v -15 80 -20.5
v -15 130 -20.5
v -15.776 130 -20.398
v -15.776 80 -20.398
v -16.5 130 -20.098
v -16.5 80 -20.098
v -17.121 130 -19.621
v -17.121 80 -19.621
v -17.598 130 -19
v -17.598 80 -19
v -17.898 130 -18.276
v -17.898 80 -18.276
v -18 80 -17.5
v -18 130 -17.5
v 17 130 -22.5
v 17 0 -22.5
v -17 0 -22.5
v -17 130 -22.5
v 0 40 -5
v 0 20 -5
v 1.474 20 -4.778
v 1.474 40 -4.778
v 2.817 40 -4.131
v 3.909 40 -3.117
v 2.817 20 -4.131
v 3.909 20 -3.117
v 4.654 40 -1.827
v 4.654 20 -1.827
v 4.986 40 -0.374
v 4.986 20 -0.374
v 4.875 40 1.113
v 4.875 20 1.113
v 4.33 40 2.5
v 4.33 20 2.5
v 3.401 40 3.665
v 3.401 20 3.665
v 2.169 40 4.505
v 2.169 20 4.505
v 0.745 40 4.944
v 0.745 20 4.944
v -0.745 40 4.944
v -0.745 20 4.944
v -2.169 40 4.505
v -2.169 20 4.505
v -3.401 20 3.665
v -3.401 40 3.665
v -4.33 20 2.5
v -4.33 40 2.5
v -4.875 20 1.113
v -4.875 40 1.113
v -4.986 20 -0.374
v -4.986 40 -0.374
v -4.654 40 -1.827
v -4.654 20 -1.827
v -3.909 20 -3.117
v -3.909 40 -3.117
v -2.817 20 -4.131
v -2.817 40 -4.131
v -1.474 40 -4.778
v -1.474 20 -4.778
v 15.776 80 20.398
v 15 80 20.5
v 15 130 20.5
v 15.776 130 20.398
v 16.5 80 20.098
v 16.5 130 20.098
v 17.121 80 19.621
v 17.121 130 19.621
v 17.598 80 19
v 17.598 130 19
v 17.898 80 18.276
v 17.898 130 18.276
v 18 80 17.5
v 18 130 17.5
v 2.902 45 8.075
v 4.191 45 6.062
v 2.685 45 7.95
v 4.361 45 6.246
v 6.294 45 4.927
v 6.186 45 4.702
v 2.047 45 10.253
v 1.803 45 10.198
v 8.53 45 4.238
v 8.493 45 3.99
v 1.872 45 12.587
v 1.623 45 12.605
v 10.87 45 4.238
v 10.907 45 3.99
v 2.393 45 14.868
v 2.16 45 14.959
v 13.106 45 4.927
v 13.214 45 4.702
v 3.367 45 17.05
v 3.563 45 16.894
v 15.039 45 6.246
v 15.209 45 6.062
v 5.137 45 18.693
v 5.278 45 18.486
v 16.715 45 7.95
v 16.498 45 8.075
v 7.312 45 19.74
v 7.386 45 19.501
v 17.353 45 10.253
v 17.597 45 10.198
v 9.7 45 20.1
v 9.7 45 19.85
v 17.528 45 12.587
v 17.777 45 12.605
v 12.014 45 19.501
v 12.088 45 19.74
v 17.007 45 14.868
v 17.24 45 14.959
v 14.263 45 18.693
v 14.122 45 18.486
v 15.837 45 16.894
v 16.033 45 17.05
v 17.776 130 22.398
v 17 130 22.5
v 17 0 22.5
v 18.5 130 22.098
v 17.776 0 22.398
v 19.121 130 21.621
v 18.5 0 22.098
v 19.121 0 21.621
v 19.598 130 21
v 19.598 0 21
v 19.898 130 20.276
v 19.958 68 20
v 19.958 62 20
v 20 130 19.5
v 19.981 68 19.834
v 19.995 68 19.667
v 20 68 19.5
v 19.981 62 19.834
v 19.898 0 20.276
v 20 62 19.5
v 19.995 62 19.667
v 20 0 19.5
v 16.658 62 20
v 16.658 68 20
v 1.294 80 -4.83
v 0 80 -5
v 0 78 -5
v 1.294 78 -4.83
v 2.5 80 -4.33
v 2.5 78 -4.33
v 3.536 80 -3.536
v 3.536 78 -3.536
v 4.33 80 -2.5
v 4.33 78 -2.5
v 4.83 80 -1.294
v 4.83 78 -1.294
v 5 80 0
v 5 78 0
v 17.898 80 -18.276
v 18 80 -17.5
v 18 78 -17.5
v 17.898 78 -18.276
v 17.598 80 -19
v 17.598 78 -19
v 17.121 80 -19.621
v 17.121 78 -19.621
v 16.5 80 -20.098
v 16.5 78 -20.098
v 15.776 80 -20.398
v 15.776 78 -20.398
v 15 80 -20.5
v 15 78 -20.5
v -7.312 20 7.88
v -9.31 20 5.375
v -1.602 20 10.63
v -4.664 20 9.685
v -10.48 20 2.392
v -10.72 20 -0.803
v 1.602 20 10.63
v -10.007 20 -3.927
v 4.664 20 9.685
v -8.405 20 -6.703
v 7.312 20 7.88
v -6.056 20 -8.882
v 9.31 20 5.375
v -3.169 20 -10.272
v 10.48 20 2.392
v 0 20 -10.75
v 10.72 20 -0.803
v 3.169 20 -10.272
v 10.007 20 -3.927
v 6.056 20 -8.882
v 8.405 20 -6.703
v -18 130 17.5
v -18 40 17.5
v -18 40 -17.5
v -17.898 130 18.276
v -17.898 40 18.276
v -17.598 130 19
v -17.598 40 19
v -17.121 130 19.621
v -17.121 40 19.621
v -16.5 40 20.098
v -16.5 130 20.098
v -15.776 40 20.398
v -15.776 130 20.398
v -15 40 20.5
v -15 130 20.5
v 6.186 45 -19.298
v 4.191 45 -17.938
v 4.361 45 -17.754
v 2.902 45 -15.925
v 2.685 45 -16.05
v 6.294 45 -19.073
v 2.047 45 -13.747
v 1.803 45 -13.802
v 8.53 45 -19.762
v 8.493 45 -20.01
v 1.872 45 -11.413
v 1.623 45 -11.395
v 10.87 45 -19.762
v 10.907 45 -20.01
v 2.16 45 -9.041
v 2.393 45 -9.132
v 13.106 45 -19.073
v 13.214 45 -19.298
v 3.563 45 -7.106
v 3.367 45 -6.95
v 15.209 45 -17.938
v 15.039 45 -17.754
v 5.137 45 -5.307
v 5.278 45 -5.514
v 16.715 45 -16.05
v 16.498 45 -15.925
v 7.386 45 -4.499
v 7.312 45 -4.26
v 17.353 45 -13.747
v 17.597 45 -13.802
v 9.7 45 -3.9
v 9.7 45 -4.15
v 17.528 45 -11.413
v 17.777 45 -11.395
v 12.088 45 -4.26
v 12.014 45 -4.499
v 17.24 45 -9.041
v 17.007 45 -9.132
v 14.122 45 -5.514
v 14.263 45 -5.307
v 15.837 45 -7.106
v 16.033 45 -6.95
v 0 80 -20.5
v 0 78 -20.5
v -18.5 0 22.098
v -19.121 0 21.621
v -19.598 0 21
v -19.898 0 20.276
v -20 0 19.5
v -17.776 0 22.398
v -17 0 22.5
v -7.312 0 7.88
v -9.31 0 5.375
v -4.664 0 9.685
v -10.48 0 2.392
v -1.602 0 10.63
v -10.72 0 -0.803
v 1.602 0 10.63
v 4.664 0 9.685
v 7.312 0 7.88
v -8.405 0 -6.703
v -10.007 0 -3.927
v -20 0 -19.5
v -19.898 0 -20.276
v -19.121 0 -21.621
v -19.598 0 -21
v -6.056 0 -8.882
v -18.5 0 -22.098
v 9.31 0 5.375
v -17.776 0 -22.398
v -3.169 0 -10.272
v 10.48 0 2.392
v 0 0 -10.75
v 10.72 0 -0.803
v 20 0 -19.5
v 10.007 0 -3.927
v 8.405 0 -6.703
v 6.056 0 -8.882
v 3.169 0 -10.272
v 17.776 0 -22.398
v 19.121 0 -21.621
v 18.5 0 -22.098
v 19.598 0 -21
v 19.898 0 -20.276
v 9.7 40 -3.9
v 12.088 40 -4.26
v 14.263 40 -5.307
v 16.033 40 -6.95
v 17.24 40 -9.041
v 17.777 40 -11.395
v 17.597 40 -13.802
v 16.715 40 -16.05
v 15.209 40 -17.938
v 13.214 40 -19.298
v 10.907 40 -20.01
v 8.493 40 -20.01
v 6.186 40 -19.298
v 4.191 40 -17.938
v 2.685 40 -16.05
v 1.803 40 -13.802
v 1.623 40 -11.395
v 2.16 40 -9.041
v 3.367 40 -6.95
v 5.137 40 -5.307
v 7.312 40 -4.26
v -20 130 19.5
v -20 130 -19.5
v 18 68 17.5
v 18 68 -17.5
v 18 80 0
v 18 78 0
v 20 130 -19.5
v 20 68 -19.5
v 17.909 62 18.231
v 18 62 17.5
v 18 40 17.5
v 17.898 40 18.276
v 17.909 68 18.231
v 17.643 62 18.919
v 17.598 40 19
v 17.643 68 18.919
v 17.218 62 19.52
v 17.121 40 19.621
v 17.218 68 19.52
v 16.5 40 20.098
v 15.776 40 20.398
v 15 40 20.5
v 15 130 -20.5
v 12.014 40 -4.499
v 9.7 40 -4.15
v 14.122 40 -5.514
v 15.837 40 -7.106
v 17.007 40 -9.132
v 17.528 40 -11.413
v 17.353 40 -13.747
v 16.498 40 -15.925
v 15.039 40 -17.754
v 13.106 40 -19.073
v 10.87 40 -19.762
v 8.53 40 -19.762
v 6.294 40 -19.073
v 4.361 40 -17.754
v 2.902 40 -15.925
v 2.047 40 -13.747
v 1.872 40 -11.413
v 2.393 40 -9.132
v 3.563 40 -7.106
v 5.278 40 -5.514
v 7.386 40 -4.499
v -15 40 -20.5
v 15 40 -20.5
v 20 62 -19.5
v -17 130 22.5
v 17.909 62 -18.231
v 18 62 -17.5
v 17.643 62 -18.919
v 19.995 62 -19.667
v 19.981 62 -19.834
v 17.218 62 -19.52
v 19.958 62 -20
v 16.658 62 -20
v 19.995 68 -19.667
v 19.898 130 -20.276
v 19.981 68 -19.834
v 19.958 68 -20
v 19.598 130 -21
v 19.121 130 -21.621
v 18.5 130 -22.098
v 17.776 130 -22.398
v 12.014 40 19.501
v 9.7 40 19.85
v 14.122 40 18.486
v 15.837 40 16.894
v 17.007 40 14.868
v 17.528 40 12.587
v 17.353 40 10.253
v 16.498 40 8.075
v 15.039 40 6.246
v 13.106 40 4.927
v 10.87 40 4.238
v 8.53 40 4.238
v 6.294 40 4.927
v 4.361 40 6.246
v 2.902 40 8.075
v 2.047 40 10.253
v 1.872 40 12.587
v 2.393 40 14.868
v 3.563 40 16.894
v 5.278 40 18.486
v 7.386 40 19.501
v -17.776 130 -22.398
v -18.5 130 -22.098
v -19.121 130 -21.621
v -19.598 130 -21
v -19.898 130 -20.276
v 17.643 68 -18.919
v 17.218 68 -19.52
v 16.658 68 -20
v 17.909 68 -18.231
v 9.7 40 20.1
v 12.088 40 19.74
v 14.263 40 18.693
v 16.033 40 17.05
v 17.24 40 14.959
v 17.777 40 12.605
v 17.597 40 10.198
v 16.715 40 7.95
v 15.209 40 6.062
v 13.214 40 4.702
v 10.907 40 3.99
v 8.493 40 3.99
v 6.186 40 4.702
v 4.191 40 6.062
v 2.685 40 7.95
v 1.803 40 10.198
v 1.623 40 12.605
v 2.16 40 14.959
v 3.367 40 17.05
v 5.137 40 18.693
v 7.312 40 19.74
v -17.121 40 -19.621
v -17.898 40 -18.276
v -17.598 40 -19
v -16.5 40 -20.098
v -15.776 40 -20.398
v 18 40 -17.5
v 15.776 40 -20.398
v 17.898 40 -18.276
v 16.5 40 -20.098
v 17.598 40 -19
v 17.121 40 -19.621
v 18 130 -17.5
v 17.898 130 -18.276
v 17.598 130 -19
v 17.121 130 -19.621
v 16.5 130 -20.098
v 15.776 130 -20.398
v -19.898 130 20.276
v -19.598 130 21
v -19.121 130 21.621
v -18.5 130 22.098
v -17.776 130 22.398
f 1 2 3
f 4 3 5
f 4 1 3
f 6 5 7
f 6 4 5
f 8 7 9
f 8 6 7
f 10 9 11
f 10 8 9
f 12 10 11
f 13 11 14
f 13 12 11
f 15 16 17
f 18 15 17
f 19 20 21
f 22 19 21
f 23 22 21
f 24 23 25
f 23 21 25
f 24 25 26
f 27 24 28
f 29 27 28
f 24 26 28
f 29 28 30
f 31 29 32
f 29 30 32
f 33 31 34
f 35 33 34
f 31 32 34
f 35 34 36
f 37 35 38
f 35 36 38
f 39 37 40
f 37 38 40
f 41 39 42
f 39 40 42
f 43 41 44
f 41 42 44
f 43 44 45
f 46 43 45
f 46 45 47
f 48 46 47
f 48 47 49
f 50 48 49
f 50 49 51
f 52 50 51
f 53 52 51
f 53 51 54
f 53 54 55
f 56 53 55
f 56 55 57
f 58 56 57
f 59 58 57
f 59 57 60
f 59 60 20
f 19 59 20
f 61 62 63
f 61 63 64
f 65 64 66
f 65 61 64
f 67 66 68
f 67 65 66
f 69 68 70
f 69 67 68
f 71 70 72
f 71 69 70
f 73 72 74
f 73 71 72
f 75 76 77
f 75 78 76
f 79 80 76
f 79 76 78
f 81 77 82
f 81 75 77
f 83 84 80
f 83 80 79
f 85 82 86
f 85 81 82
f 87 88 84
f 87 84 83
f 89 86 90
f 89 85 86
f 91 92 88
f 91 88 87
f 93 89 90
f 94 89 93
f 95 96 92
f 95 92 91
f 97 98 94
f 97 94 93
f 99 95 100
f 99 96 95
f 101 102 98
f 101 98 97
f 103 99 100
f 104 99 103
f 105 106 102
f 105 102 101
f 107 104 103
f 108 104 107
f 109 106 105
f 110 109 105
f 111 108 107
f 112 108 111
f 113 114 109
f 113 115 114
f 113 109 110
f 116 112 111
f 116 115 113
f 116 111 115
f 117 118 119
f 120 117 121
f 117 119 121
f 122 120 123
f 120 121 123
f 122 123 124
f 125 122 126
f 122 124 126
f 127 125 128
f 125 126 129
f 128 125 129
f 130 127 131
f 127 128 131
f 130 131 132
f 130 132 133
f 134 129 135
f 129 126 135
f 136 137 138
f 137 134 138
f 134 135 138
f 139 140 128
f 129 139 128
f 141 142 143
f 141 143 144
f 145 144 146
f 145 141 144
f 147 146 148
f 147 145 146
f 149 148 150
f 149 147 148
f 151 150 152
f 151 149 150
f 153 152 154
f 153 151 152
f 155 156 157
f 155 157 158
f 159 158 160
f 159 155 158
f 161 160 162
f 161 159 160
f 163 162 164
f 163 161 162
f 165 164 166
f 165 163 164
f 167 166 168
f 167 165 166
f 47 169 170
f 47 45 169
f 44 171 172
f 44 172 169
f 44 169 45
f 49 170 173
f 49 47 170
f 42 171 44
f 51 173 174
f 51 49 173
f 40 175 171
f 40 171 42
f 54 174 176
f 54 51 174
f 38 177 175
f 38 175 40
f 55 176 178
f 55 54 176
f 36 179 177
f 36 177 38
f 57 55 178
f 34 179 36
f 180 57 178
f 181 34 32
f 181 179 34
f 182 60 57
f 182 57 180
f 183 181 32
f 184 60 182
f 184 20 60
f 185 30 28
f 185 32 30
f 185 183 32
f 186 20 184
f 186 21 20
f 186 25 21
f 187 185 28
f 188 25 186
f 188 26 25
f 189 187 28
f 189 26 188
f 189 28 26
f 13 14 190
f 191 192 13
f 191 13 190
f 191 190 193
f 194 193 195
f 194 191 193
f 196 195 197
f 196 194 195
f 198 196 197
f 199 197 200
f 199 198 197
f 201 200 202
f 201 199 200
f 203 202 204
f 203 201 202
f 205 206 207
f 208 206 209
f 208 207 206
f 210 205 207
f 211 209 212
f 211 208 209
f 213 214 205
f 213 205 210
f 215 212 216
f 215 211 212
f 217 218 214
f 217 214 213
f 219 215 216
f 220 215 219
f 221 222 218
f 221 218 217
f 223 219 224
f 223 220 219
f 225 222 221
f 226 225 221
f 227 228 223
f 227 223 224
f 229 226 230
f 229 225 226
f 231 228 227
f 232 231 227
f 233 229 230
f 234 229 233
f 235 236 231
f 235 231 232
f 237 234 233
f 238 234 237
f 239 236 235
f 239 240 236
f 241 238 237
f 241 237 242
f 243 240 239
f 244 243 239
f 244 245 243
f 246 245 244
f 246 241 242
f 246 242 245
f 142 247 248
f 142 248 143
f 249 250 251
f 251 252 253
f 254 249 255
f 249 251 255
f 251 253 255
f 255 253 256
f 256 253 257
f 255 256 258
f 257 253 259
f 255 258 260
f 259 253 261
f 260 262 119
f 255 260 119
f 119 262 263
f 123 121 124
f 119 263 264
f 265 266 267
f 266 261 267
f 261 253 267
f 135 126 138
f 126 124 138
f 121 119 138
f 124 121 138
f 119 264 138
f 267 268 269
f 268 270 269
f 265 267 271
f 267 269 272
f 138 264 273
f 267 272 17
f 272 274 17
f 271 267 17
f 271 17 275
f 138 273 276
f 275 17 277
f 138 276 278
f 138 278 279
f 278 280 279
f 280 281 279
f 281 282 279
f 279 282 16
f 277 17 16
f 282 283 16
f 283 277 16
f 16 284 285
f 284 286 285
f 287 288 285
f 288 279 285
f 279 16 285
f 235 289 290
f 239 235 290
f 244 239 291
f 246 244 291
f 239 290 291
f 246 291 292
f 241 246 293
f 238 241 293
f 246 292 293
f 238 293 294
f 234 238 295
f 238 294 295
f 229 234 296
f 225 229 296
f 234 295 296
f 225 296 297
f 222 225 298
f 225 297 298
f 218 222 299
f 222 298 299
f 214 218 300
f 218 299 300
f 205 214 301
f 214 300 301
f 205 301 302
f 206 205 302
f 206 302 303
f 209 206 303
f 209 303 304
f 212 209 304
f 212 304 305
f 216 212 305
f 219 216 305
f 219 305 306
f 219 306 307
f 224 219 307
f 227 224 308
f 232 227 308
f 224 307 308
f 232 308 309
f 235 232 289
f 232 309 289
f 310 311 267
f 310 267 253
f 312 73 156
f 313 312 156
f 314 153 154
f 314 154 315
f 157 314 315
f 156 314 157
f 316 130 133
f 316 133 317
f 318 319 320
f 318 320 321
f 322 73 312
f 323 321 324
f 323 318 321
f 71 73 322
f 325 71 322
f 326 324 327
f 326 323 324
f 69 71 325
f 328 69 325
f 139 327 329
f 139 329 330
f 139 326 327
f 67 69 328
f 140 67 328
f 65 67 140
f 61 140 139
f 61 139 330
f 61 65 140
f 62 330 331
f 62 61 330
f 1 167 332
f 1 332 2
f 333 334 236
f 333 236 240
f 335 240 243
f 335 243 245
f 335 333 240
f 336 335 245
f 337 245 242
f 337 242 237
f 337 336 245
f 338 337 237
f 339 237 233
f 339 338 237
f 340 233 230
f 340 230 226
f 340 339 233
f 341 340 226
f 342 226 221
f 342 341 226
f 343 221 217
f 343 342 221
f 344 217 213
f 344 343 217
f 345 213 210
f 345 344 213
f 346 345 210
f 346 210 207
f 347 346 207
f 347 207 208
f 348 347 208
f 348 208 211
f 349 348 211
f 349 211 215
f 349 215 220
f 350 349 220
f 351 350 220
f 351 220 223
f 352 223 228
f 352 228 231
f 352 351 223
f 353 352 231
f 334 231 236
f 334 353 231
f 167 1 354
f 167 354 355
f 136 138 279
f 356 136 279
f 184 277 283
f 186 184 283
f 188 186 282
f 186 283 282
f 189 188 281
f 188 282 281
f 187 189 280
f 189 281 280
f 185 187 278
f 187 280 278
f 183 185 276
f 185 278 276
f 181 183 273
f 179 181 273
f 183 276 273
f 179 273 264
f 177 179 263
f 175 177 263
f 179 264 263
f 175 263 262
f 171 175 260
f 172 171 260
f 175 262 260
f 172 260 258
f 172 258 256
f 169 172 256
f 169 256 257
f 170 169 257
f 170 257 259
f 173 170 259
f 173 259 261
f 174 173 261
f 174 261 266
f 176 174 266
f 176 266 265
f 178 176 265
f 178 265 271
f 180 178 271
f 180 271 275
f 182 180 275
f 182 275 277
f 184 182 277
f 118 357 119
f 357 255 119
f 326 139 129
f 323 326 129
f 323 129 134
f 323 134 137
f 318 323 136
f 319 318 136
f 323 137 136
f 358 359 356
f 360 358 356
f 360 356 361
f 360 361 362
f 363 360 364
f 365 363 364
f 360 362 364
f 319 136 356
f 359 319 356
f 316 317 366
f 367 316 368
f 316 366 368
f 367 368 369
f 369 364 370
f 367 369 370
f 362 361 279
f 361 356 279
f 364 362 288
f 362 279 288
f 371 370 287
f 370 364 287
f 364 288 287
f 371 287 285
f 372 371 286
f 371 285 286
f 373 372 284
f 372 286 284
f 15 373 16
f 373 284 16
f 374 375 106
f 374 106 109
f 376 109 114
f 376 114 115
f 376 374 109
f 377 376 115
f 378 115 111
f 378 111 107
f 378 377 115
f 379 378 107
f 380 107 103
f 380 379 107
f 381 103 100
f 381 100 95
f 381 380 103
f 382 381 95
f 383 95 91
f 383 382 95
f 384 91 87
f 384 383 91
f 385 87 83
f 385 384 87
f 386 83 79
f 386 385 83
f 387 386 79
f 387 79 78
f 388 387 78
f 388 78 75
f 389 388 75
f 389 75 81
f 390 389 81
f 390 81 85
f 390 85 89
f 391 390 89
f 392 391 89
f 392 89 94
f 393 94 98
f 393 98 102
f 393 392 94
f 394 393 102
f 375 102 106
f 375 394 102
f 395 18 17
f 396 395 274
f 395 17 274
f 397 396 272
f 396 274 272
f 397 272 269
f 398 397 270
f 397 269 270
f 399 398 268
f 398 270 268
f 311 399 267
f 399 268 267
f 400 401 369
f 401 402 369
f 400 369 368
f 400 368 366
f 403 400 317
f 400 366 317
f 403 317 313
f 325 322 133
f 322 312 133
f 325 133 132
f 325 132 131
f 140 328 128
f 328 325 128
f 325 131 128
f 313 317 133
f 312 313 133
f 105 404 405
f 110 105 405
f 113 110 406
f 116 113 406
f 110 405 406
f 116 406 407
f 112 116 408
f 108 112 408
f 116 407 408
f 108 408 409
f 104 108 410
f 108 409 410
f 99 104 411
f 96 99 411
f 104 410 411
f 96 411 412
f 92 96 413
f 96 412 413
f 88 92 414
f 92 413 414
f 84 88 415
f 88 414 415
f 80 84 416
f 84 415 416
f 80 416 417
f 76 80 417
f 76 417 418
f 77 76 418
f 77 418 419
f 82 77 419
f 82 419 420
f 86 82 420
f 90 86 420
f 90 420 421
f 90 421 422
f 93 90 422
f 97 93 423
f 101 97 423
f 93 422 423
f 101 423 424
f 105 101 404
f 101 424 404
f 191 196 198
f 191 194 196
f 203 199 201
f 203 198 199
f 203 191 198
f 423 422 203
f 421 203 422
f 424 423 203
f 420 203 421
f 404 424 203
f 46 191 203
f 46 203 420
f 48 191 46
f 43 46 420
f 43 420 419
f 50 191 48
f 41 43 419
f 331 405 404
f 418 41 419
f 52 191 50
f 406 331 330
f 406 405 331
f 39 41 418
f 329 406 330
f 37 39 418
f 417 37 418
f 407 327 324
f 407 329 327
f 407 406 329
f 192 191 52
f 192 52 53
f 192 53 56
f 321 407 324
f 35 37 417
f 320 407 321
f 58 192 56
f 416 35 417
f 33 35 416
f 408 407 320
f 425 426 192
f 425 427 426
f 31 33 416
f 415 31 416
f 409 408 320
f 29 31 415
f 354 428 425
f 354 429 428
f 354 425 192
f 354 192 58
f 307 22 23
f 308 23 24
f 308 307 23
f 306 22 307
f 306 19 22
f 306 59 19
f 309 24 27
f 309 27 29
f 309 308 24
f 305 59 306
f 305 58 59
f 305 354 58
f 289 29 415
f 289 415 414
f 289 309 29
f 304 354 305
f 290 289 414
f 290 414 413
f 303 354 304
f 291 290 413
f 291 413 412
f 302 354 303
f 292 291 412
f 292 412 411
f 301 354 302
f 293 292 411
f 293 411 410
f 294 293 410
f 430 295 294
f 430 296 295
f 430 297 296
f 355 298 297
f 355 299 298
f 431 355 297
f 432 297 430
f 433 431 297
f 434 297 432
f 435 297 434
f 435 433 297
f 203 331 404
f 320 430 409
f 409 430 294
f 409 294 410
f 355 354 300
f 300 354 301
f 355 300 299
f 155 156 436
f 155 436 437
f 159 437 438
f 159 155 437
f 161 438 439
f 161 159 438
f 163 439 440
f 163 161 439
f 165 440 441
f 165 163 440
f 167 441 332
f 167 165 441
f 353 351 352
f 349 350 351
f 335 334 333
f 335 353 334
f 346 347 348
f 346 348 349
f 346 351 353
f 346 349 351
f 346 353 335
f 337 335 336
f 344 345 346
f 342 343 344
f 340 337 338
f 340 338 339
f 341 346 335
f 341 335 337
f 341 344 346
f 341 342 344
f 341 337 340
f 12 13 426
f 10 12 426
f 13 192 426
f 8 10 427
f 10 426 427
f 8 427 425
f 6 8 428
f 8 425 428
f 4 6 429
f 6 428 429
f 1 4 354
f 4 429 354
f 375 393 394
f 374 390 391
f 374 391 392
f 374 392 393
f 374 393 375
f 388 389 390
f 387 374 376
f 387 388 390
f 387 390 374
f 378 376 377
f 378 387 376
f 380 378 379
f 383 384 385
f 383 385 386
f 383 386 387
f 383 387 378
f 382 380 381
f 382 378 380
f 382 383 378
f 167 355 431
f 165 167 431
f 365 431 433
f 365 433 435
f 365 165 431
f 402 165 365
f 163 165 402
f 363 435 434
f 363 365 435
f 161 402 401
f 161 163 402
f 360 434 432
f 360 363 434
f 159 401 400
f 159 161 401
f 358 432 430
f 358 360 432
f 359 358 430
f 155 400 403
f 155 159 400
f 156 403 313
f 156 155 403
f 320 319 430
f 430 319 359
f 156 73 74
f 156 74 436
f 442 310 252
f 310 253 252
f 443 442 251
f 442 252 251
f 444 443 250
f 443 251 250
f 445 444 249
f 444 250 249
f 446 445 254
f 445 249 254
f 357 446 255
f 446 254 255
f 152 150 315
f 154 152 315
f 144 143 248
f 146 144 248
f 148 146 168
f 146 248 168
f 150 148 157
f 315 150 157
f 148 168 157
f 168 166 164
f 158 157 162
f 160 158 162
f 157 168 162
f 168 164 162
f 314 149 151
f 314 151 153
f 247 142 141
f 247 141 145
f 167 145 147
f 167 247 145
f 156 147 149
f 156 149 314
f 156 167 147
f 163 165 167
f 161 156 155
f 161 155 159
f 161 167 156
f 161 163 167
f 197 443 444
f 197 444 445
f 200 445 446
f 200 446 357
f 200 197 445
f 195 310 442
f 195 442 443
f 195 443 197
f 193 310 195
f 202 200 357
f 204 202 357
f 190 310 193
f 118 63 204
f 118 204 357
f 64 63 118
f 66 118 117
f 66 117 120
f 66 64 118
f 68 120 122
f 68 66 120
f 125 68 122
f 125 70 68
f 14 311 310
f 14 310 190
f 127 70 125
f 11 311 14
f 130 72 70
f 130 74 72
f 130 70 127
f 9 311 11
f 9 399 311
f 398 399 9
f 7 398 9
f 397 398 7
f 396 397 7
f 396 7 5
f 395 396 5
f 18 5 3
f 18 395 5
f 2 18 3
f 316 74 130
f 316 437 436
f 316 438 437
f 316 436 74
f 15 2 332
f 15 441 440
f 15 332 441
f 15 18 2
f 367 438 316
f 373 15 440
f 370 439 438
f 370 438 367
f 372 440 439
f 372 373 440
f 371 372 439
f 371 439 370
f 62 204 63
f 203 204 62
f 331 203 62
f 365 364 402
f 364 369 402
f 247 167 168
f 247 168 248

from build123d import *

# Parameters (mm, degrees)
SKETCH2_W              = 40
SKETCH2_H              = 45
BOSS_EXTRUDE1_DEPTH    = 80
SKETCH3_R              = 10.75
CUT_EXTRUDE1_DEPTH     = 20
SKETCH5_W              = 36
SKETCH5_H              = 41
CUT_EXTRUDE2_DEPTH     = 40
SKETCH6_R              = 5
CUT_EXTRUDE3_DEPTH     = 100
SKETCH7_W              = 40
SKETCH7_H              = 6
CUT_EXTRUDE4_DEPTH     = 10
FILLET1_R              = 3
FILLET2_R              = 3
FILLET3_R              = 3
FILLET4_R              = 3
FILLET5_R              = 3
FILLET6_R              = 3
SPLIT1_SURFACE_1_BACK  = 101.125
SPLIT1_SURFACE_1_DEPTH = 202.25
SPLIT1_SURFACE_2_BACK  = 101.125
SPLIT1_SURFACE_2_DEPTH = 202.25
SKETCH10_R             = 8.1
SKETCH10_R_2           = 7.85
BOSS_EXTRUDE2_DEPTH    = 5
BOSS_EXTRUDE6_DEPTH    = 2
BOSS_EXTRUDE3_DEPTH    = 50


with BuildPart() as part:
    # Sketch2 → Boss-Extrude1 (new body)
    with BuildSketch(Plane(origin=(0, 0, 0), x_dir=(1, 0, 0), z_dir=(0, 1, 0))):
        Rectangle(SKETCH2_W, SKETCH2_H)
    extrude(amount=BOSS_EXTRUDE1_DEPTH)

    # Sketch3 → Cut-Extrude1 (cut)
    with BuildSketch(Plane.XZ):
        with Locations(Location((0, 0, 0), (0, 0, 270))):
            Circle(SKETCH3_R)
    extrude(amount=-CUT_EXTRUDE1_DEPTH, mode=Mode.SUBTRACT)

    # Sketch5 → Cut-Extrude2 (cut)
    with BuildSketch(Plane(origin=(0, 80, 0), x_dir=(1, 0, 0), z_dir=(0, 1, 0))):
        Rectangle(SKETCH5_W, SKETCH5_H)
    extrude(amount=-CUT_EXTRUDE2_DEPTH, mode=Mode.SUBTRACT)

    # Sketch6 → Cut-Extrude3 (cut)
    with BuildSketch(Plane.XZ.offset(-20)):
        with Locations(Location((0, 0, 0), (0, 0, 270))):
            Circle(SKETCH6_R)
    extrude(amount=-CUT_EXTRUDE3_DEPTH, mode=Mode.SUBTRACT)

    # Sketch7 → Cut-Extrude4 (cut)
    with BuildSketch(Plane(origin=(20, 0, 0), x_dir=(0, 0, -1), z_dir=(1, 0, 0))):
        with Locations((0, 65)):
            Rectangle(SKETCH7_W, SKETCH7_H)
    extrude(amount=-CUT_EXTRUDE4_DEPTH, mode=Mode.SUBTRACT)

    # Fillet1
    # the kernel refuses this fillet: 3 mm, written as the material it takes off along each edge
    with BuildSketch(Plane(origin=(20, -7.5, 22.5), x_dir=(0, 0, -1), z_dir=(0, 1, 0)), Plane(origin=(20, -7.5, -22.5), x_dir=(-1, 0, 0), z_dir=(0, 1, 0))) as fillet1_piece_1:
        with BuildLine():
            CenterArc((FILLET1_R, FILLET1_R), FILLET1_R, 180, 90)
            Line((0, FILLET1_R), (0, 0))
            Line((0, 0), (FILLET1_R, 0))
        make_face()
    extrude(amount=95, mode=Mode.SUBTRACT)

    # Fillet2
    fillet2_edges = [part.edges().sort_by_distance(p)[0] for p in [
        (-20, 40, 22.5),
        (-20, 40, -22.5),
    ]]
    fillet(fillet2_edges, radius=FILLET2_R)

    # Fillet3
    fillet3_edges = [part.edges().sort_by_distance(p)[0] for p in [
        (-18, 60, -20.5),
    ]]
    fillet(fillet3_edges, radius=FILLET3_R)

    # Fillet4
    # the kernel refuses this fillet: 3 mm, written as the material it adds along each edge
    with BuildSketch(Plane(origin=(18, 80, -20.5), x_dir=(-1, 0, 0), z_dir=(0, -1, 0))) as fillet4_piece_1_section:
        with BuildLine():
            CenterArc((FILLET4_R, -FILLET4_R), FILLET4_R, 90, 90)
            Line((0, -FILLET4_R), (0, 0))
            Line((0, 0), (FILLET4_R, 0))
        make_face()
    fillet4_piece_1 = extrude(amount=47.5, mode=Mode.PRIVATE)
    fillet4_piece_1 = split(fillet4_piece_1, bisect_by=Plane(origin=(17.022641749, 74, -20), z_dir=(0, 0, -1)), keep=Keep.TOP, mode=Mode.PRIVATE)
    add(fillet4_piece_1)
    with BuildSketch(Plane(origin=(18, 80, -20.5), x_dir=(-1, 0, 0), z_dir=(0, -1, 0))) as fillet4_piece_2_section:
        with BuildLine():
            CenterArc((FILLET4_R, -FILLET4_R), FILLET4_R, 90, 90)
            Line((0, -FILLET4_R), (0, 0))
            Line((0, 0), (FILLET4_R, 0))
        make_face()
    fillet4_piece_2 = extrude(amount=47.5, mode=Mode.PRIVATE)
    fillet4_piece_2 = split(fillet4_piece_2, bisect_by=Plane(origin=(17.619593503, 68, -19.406346205), z_dir=(0, 1, 0)), keep=Keep.TOP, mode=Mode.PRIVATE)
    add(fillet4_piece_2)
    with BuildSketch(Plane(origin=(18, 87.5, -20.5), x_dir=(-1, 0, 0), z_dir=(0, -1, 0))) as fillet4_piece_3_section:
        with BuildLine():
            CenterArc((FILLET4_R, -FILLET4_R), FILLET4_R, 90, 90)
            Line((0, -FILLET4_R), (0, 0))
            Line((0, 0), (FILLET4_R, 0))
        make_face()
    fillet4_piece_3 = extrude(amount=55, mode=Mode.PRIVATE)
    fillet4_piece_3 = split(fillet4_piece_3, bisect_by=Plane(origin=(17.619593503, 62, -19.406346205), z_dir=(0, -1, 0)), keep=Keep.TOP, mode=Mode.PRIVATE)
    add(fillet4_piece_3)

    # Fillet5
    fillet5_edges = [part.edges().sort_by_distance(p)[0] for p in [
        (-18, 60, 20.5),
    ]]
    fillet(fillet5_edges, radius=FILLET5_R)

    # Fillet6
    # the kernel refuses this fillet: 3 mm, written as the material it adds along each edge
    with BuildSketch(Plane(origin=(18, 80, 20.5), x_dir=(-1, 0, 0), z_dir=(0, -1, 0))) as fillet6_piece_1_section:
        with BuildLine():
            CenterArc((FILLET6_R, FILLET6_R), FILLET6_R, 180, 90)
            Line((0, FILLET6_R), (0, 0))
            Line((0, 0), (FILLET6_R, 0))
        make_face()
    fillet6_piece_1 = extrude(amount=47.5, mode=Mode.PRIVATE)
    fillet6_piece_1 = split(fillet6_piece_1, bisect_by=Plane(origin=(17.022641749, 74, 20), z_dir=(0, 0, 1)), keep=Keep.TOP, mode=Mode.PRIVATE)
    add(fillet6_piece_1)
    with BuildSketch(Plane(origin=(18, 80, 20.5), x_dir=(-1, 0, 0), z_dir=(0, -1, 0))) as fillet6_piece_2_section:
        with BuildLine():
            CenterArc((FILLET6_R, FILLET6_R), FILLET6_R, 180, 90)
            Line((0, FILLET6_R), (0, 0))
            Line((0, 0), (FILLET6_R, 0))
        make_face()
    fillet6_piece_2 = extrude(amount=47.5, mode=Mode.PRIVATE)
    fillet6_piece_2 = split(fillet6_piece_2, bisect_by=Plane(origin=(17.619593503, 68, 19.406346205), z_dir=(0, 1, 0)), keep=Keep.TOP, mode=Mode.PRIVATE)
    add(fillet6_piece_2)
    with BuildSketch(Plane(origin=(18, 87.5, 20.5), x_dir=(-1, 0, 0), z_dir=(0, -1, 0))) as fillet6_piece_3_section:
        with BuildLine():
            CenterArc((FILLET6_R, FILLET6_R), FILLET6_R, 180, 90)
            Line((0, FILLET6_R), (0, 0))
            Line((0, 0), (FILLET6_R, 0))
        make_face()
    fillet6_piece_3 = extrude(amount=55, mode=Mode.PRIVATE)
    fillet6_piece_3 = split(fillet6_piece_3, bisect_by=Plane(origin=(17.619593503, 62, 19.406346205), z_dir=(0, -1, 0)), keep=Keep.TOP, mode=Mode.PRIVATE)
    add(fillet6_piece_3)


with BuildPart() as body_2:
    # Split1: the piece behind the surface
    add(part.part)
    # Split1 surface: a surface, the sketch's curves swept straight by 202.25 mm
    with BuildLine(Plane(origin=(0, 80, 0), x_dir=(1, 0, 0), z_dir=(0, 1, 0)).offset(-SPLIT1_SURFACE_1_BACK), mode=Mode.PRIVATE) as split1_surface_1_path:
        Line((0, 22.5), (0, 0))
        Line((0, 0), (0, -22.5))
    split1_surface_1 = Shell.extrude(split1_surface_1_path.wire(), (0 * SPLIT1_SURFACE_1_DEPTH, 1 * SPLIT1_SURFACE_1_DEPTH, 0 * SPLIT1_SURFACE_1_DEPTH))
    split(bisect_by=split1_surface_1, keep=Keep.BOTTOM)


with BuildPart() as part_1:
    add(part.part)

    # Split1: split by a surface, the side it looks to stays
    # Split1 surface: a surface, the sketch's curves swept straight by 202.25 mm
    with BuildLine(Plane(origin=(0, 80, 0), x_dir=(1, 0, 0), z_dir=(0, 1, 0)).offset(-SPLIT1_SURFACE_2_BACK), mode=Mode.PRIVATE) as split1_surface_2_path:
        Line((0, 22.5), (0, 0))
        Line((0, 0), (0, -22.5))
    split1_surface_2 = Shell.extrude(split1_surface_2_path.wire(), (0 * SPLIT1_SURFACE_2_DEPTH, 1 * SPLIT1_SURFACE_2_DEPTH, 0 * SPLIT1_SURFACE_2_DEPTH))
    split(bisect_by=split1_surface_2, keep=Keep.TOP)

    # Sketch10 → Boss-Extrude2 (add)
    # profile 1 of 2: a face of its own
    with BuildSketch(Plane(origin=(0, 40, 0), x_dir=(1, 0, 0), z_dir=(0, 1, 0))):
        with Locations(Location((9.7, 12, 0), (0, 0, 270))):
            Circle(SKETCH10_R)
        with Locations(Location((9.7, 12, 0), (0, 0, 270))):
            Circle(SKETCH10_R_2, mode=Mode.SUBTRACT)
    # profile 2 of 2: a face of its own
    with BuildSketch(Plane(origin=(0, 40, 0), x_dir=(1, 0, 0), z_dir=(0, 1, 0))):
        with Locations(Location((9.7, -12, 0), (0, 0, 270))):
            Circle(SKETCH10_R)
        with Locations(Location((9.7, -12, 0), (0, 0, 270))):
            Circle(SKETCH10_R_2, mode=Mode.SUBTRACT)
    extrude(amount=BOSS_EXTRUDE2_DEPTH)

    add(body_2.part)  # Boss-Extrude3 merges body 2
    # Sketch11 → Boss-Extrude3 (add)
    with BuildSketch(Plane(origin=(0, 80, 0), x_dir=(1, 0, 0), z_dir=(0, 1, 0))):
        with BuildLine():
            Line((-20, 19.5), (-20, -19.5))
            ThreePointArc((-20, -19.5), (-19.121320344, -21.621320344), (-17, -22.5))
            Line((-17, -22.5), (17, -22.5))
            ThreePointArc((17, -22.5), (19.121320344, -21.621320344), (20, -19.5))
            Line((20, -19.5), (20, 19.5))
            ThreePointArc((20, 19.5), (19.121320344, 21.621320344), (17, 22.5))
            Line((17, 22.5), (-17, 22.5))
            ThreePointArc((-17, 22.5), (-19.121320344, 21.621320344), (-20, 19.5))
        make_face()
        with BuildLine():
            Line((-18, 17.5), (-18, -17.5))
            ThreePointArc((-18, -17.5), (-17.121320344, -19.621320344), (-15, -20.5))
            Line((-15, -20.5), (15, -20.5))
            ThreePointArc((15, -20.5), (17.121320344, -19.621320344), (18, -17.5))
            Line((18, -17.5), (18, 17.5))
            ThreePointArc((18, 17.5), (17.121320344, 19.621320344), (15, 20.5))
            Line((15, 20.5), (-15, 20.5))
            ThreePointArc((-15, 20.5), (-17.121320344, 19.621320344), (-18, 17.5))
        make_face(mode=Mode.SUBTRACT)
    extrude(amount=BOSS_EXTRUDE3_DEPTH)


with BuildPart() as body_3:
    # Sketch15 → Boss-Extrude6 (new body)
    with BuildSketch(Plane(origin=(0, 80, 0), x_dir=(1, 0, 0), z_dir=(0, 1, 0))):
        with BuildLine():
            Line((0, 20.5), (0, 5))
            ThreePointArc((0, 5), (3.535533906, 3.535533906), (5, 0))
            Line((5, 0), (18, 0))
            Line((18, 0), (18, 17.5))
            ThreePointArc((18, 17.5), (17.121320344, 19.621320344), (15, 20.5))
            Line((15, 20.5), (0, 20.5))
        make_face()
    extrude(amount=-BOSS_EXTRUDE6_DEPTH)


solid = Compound([part_1.part, body_3.part])
